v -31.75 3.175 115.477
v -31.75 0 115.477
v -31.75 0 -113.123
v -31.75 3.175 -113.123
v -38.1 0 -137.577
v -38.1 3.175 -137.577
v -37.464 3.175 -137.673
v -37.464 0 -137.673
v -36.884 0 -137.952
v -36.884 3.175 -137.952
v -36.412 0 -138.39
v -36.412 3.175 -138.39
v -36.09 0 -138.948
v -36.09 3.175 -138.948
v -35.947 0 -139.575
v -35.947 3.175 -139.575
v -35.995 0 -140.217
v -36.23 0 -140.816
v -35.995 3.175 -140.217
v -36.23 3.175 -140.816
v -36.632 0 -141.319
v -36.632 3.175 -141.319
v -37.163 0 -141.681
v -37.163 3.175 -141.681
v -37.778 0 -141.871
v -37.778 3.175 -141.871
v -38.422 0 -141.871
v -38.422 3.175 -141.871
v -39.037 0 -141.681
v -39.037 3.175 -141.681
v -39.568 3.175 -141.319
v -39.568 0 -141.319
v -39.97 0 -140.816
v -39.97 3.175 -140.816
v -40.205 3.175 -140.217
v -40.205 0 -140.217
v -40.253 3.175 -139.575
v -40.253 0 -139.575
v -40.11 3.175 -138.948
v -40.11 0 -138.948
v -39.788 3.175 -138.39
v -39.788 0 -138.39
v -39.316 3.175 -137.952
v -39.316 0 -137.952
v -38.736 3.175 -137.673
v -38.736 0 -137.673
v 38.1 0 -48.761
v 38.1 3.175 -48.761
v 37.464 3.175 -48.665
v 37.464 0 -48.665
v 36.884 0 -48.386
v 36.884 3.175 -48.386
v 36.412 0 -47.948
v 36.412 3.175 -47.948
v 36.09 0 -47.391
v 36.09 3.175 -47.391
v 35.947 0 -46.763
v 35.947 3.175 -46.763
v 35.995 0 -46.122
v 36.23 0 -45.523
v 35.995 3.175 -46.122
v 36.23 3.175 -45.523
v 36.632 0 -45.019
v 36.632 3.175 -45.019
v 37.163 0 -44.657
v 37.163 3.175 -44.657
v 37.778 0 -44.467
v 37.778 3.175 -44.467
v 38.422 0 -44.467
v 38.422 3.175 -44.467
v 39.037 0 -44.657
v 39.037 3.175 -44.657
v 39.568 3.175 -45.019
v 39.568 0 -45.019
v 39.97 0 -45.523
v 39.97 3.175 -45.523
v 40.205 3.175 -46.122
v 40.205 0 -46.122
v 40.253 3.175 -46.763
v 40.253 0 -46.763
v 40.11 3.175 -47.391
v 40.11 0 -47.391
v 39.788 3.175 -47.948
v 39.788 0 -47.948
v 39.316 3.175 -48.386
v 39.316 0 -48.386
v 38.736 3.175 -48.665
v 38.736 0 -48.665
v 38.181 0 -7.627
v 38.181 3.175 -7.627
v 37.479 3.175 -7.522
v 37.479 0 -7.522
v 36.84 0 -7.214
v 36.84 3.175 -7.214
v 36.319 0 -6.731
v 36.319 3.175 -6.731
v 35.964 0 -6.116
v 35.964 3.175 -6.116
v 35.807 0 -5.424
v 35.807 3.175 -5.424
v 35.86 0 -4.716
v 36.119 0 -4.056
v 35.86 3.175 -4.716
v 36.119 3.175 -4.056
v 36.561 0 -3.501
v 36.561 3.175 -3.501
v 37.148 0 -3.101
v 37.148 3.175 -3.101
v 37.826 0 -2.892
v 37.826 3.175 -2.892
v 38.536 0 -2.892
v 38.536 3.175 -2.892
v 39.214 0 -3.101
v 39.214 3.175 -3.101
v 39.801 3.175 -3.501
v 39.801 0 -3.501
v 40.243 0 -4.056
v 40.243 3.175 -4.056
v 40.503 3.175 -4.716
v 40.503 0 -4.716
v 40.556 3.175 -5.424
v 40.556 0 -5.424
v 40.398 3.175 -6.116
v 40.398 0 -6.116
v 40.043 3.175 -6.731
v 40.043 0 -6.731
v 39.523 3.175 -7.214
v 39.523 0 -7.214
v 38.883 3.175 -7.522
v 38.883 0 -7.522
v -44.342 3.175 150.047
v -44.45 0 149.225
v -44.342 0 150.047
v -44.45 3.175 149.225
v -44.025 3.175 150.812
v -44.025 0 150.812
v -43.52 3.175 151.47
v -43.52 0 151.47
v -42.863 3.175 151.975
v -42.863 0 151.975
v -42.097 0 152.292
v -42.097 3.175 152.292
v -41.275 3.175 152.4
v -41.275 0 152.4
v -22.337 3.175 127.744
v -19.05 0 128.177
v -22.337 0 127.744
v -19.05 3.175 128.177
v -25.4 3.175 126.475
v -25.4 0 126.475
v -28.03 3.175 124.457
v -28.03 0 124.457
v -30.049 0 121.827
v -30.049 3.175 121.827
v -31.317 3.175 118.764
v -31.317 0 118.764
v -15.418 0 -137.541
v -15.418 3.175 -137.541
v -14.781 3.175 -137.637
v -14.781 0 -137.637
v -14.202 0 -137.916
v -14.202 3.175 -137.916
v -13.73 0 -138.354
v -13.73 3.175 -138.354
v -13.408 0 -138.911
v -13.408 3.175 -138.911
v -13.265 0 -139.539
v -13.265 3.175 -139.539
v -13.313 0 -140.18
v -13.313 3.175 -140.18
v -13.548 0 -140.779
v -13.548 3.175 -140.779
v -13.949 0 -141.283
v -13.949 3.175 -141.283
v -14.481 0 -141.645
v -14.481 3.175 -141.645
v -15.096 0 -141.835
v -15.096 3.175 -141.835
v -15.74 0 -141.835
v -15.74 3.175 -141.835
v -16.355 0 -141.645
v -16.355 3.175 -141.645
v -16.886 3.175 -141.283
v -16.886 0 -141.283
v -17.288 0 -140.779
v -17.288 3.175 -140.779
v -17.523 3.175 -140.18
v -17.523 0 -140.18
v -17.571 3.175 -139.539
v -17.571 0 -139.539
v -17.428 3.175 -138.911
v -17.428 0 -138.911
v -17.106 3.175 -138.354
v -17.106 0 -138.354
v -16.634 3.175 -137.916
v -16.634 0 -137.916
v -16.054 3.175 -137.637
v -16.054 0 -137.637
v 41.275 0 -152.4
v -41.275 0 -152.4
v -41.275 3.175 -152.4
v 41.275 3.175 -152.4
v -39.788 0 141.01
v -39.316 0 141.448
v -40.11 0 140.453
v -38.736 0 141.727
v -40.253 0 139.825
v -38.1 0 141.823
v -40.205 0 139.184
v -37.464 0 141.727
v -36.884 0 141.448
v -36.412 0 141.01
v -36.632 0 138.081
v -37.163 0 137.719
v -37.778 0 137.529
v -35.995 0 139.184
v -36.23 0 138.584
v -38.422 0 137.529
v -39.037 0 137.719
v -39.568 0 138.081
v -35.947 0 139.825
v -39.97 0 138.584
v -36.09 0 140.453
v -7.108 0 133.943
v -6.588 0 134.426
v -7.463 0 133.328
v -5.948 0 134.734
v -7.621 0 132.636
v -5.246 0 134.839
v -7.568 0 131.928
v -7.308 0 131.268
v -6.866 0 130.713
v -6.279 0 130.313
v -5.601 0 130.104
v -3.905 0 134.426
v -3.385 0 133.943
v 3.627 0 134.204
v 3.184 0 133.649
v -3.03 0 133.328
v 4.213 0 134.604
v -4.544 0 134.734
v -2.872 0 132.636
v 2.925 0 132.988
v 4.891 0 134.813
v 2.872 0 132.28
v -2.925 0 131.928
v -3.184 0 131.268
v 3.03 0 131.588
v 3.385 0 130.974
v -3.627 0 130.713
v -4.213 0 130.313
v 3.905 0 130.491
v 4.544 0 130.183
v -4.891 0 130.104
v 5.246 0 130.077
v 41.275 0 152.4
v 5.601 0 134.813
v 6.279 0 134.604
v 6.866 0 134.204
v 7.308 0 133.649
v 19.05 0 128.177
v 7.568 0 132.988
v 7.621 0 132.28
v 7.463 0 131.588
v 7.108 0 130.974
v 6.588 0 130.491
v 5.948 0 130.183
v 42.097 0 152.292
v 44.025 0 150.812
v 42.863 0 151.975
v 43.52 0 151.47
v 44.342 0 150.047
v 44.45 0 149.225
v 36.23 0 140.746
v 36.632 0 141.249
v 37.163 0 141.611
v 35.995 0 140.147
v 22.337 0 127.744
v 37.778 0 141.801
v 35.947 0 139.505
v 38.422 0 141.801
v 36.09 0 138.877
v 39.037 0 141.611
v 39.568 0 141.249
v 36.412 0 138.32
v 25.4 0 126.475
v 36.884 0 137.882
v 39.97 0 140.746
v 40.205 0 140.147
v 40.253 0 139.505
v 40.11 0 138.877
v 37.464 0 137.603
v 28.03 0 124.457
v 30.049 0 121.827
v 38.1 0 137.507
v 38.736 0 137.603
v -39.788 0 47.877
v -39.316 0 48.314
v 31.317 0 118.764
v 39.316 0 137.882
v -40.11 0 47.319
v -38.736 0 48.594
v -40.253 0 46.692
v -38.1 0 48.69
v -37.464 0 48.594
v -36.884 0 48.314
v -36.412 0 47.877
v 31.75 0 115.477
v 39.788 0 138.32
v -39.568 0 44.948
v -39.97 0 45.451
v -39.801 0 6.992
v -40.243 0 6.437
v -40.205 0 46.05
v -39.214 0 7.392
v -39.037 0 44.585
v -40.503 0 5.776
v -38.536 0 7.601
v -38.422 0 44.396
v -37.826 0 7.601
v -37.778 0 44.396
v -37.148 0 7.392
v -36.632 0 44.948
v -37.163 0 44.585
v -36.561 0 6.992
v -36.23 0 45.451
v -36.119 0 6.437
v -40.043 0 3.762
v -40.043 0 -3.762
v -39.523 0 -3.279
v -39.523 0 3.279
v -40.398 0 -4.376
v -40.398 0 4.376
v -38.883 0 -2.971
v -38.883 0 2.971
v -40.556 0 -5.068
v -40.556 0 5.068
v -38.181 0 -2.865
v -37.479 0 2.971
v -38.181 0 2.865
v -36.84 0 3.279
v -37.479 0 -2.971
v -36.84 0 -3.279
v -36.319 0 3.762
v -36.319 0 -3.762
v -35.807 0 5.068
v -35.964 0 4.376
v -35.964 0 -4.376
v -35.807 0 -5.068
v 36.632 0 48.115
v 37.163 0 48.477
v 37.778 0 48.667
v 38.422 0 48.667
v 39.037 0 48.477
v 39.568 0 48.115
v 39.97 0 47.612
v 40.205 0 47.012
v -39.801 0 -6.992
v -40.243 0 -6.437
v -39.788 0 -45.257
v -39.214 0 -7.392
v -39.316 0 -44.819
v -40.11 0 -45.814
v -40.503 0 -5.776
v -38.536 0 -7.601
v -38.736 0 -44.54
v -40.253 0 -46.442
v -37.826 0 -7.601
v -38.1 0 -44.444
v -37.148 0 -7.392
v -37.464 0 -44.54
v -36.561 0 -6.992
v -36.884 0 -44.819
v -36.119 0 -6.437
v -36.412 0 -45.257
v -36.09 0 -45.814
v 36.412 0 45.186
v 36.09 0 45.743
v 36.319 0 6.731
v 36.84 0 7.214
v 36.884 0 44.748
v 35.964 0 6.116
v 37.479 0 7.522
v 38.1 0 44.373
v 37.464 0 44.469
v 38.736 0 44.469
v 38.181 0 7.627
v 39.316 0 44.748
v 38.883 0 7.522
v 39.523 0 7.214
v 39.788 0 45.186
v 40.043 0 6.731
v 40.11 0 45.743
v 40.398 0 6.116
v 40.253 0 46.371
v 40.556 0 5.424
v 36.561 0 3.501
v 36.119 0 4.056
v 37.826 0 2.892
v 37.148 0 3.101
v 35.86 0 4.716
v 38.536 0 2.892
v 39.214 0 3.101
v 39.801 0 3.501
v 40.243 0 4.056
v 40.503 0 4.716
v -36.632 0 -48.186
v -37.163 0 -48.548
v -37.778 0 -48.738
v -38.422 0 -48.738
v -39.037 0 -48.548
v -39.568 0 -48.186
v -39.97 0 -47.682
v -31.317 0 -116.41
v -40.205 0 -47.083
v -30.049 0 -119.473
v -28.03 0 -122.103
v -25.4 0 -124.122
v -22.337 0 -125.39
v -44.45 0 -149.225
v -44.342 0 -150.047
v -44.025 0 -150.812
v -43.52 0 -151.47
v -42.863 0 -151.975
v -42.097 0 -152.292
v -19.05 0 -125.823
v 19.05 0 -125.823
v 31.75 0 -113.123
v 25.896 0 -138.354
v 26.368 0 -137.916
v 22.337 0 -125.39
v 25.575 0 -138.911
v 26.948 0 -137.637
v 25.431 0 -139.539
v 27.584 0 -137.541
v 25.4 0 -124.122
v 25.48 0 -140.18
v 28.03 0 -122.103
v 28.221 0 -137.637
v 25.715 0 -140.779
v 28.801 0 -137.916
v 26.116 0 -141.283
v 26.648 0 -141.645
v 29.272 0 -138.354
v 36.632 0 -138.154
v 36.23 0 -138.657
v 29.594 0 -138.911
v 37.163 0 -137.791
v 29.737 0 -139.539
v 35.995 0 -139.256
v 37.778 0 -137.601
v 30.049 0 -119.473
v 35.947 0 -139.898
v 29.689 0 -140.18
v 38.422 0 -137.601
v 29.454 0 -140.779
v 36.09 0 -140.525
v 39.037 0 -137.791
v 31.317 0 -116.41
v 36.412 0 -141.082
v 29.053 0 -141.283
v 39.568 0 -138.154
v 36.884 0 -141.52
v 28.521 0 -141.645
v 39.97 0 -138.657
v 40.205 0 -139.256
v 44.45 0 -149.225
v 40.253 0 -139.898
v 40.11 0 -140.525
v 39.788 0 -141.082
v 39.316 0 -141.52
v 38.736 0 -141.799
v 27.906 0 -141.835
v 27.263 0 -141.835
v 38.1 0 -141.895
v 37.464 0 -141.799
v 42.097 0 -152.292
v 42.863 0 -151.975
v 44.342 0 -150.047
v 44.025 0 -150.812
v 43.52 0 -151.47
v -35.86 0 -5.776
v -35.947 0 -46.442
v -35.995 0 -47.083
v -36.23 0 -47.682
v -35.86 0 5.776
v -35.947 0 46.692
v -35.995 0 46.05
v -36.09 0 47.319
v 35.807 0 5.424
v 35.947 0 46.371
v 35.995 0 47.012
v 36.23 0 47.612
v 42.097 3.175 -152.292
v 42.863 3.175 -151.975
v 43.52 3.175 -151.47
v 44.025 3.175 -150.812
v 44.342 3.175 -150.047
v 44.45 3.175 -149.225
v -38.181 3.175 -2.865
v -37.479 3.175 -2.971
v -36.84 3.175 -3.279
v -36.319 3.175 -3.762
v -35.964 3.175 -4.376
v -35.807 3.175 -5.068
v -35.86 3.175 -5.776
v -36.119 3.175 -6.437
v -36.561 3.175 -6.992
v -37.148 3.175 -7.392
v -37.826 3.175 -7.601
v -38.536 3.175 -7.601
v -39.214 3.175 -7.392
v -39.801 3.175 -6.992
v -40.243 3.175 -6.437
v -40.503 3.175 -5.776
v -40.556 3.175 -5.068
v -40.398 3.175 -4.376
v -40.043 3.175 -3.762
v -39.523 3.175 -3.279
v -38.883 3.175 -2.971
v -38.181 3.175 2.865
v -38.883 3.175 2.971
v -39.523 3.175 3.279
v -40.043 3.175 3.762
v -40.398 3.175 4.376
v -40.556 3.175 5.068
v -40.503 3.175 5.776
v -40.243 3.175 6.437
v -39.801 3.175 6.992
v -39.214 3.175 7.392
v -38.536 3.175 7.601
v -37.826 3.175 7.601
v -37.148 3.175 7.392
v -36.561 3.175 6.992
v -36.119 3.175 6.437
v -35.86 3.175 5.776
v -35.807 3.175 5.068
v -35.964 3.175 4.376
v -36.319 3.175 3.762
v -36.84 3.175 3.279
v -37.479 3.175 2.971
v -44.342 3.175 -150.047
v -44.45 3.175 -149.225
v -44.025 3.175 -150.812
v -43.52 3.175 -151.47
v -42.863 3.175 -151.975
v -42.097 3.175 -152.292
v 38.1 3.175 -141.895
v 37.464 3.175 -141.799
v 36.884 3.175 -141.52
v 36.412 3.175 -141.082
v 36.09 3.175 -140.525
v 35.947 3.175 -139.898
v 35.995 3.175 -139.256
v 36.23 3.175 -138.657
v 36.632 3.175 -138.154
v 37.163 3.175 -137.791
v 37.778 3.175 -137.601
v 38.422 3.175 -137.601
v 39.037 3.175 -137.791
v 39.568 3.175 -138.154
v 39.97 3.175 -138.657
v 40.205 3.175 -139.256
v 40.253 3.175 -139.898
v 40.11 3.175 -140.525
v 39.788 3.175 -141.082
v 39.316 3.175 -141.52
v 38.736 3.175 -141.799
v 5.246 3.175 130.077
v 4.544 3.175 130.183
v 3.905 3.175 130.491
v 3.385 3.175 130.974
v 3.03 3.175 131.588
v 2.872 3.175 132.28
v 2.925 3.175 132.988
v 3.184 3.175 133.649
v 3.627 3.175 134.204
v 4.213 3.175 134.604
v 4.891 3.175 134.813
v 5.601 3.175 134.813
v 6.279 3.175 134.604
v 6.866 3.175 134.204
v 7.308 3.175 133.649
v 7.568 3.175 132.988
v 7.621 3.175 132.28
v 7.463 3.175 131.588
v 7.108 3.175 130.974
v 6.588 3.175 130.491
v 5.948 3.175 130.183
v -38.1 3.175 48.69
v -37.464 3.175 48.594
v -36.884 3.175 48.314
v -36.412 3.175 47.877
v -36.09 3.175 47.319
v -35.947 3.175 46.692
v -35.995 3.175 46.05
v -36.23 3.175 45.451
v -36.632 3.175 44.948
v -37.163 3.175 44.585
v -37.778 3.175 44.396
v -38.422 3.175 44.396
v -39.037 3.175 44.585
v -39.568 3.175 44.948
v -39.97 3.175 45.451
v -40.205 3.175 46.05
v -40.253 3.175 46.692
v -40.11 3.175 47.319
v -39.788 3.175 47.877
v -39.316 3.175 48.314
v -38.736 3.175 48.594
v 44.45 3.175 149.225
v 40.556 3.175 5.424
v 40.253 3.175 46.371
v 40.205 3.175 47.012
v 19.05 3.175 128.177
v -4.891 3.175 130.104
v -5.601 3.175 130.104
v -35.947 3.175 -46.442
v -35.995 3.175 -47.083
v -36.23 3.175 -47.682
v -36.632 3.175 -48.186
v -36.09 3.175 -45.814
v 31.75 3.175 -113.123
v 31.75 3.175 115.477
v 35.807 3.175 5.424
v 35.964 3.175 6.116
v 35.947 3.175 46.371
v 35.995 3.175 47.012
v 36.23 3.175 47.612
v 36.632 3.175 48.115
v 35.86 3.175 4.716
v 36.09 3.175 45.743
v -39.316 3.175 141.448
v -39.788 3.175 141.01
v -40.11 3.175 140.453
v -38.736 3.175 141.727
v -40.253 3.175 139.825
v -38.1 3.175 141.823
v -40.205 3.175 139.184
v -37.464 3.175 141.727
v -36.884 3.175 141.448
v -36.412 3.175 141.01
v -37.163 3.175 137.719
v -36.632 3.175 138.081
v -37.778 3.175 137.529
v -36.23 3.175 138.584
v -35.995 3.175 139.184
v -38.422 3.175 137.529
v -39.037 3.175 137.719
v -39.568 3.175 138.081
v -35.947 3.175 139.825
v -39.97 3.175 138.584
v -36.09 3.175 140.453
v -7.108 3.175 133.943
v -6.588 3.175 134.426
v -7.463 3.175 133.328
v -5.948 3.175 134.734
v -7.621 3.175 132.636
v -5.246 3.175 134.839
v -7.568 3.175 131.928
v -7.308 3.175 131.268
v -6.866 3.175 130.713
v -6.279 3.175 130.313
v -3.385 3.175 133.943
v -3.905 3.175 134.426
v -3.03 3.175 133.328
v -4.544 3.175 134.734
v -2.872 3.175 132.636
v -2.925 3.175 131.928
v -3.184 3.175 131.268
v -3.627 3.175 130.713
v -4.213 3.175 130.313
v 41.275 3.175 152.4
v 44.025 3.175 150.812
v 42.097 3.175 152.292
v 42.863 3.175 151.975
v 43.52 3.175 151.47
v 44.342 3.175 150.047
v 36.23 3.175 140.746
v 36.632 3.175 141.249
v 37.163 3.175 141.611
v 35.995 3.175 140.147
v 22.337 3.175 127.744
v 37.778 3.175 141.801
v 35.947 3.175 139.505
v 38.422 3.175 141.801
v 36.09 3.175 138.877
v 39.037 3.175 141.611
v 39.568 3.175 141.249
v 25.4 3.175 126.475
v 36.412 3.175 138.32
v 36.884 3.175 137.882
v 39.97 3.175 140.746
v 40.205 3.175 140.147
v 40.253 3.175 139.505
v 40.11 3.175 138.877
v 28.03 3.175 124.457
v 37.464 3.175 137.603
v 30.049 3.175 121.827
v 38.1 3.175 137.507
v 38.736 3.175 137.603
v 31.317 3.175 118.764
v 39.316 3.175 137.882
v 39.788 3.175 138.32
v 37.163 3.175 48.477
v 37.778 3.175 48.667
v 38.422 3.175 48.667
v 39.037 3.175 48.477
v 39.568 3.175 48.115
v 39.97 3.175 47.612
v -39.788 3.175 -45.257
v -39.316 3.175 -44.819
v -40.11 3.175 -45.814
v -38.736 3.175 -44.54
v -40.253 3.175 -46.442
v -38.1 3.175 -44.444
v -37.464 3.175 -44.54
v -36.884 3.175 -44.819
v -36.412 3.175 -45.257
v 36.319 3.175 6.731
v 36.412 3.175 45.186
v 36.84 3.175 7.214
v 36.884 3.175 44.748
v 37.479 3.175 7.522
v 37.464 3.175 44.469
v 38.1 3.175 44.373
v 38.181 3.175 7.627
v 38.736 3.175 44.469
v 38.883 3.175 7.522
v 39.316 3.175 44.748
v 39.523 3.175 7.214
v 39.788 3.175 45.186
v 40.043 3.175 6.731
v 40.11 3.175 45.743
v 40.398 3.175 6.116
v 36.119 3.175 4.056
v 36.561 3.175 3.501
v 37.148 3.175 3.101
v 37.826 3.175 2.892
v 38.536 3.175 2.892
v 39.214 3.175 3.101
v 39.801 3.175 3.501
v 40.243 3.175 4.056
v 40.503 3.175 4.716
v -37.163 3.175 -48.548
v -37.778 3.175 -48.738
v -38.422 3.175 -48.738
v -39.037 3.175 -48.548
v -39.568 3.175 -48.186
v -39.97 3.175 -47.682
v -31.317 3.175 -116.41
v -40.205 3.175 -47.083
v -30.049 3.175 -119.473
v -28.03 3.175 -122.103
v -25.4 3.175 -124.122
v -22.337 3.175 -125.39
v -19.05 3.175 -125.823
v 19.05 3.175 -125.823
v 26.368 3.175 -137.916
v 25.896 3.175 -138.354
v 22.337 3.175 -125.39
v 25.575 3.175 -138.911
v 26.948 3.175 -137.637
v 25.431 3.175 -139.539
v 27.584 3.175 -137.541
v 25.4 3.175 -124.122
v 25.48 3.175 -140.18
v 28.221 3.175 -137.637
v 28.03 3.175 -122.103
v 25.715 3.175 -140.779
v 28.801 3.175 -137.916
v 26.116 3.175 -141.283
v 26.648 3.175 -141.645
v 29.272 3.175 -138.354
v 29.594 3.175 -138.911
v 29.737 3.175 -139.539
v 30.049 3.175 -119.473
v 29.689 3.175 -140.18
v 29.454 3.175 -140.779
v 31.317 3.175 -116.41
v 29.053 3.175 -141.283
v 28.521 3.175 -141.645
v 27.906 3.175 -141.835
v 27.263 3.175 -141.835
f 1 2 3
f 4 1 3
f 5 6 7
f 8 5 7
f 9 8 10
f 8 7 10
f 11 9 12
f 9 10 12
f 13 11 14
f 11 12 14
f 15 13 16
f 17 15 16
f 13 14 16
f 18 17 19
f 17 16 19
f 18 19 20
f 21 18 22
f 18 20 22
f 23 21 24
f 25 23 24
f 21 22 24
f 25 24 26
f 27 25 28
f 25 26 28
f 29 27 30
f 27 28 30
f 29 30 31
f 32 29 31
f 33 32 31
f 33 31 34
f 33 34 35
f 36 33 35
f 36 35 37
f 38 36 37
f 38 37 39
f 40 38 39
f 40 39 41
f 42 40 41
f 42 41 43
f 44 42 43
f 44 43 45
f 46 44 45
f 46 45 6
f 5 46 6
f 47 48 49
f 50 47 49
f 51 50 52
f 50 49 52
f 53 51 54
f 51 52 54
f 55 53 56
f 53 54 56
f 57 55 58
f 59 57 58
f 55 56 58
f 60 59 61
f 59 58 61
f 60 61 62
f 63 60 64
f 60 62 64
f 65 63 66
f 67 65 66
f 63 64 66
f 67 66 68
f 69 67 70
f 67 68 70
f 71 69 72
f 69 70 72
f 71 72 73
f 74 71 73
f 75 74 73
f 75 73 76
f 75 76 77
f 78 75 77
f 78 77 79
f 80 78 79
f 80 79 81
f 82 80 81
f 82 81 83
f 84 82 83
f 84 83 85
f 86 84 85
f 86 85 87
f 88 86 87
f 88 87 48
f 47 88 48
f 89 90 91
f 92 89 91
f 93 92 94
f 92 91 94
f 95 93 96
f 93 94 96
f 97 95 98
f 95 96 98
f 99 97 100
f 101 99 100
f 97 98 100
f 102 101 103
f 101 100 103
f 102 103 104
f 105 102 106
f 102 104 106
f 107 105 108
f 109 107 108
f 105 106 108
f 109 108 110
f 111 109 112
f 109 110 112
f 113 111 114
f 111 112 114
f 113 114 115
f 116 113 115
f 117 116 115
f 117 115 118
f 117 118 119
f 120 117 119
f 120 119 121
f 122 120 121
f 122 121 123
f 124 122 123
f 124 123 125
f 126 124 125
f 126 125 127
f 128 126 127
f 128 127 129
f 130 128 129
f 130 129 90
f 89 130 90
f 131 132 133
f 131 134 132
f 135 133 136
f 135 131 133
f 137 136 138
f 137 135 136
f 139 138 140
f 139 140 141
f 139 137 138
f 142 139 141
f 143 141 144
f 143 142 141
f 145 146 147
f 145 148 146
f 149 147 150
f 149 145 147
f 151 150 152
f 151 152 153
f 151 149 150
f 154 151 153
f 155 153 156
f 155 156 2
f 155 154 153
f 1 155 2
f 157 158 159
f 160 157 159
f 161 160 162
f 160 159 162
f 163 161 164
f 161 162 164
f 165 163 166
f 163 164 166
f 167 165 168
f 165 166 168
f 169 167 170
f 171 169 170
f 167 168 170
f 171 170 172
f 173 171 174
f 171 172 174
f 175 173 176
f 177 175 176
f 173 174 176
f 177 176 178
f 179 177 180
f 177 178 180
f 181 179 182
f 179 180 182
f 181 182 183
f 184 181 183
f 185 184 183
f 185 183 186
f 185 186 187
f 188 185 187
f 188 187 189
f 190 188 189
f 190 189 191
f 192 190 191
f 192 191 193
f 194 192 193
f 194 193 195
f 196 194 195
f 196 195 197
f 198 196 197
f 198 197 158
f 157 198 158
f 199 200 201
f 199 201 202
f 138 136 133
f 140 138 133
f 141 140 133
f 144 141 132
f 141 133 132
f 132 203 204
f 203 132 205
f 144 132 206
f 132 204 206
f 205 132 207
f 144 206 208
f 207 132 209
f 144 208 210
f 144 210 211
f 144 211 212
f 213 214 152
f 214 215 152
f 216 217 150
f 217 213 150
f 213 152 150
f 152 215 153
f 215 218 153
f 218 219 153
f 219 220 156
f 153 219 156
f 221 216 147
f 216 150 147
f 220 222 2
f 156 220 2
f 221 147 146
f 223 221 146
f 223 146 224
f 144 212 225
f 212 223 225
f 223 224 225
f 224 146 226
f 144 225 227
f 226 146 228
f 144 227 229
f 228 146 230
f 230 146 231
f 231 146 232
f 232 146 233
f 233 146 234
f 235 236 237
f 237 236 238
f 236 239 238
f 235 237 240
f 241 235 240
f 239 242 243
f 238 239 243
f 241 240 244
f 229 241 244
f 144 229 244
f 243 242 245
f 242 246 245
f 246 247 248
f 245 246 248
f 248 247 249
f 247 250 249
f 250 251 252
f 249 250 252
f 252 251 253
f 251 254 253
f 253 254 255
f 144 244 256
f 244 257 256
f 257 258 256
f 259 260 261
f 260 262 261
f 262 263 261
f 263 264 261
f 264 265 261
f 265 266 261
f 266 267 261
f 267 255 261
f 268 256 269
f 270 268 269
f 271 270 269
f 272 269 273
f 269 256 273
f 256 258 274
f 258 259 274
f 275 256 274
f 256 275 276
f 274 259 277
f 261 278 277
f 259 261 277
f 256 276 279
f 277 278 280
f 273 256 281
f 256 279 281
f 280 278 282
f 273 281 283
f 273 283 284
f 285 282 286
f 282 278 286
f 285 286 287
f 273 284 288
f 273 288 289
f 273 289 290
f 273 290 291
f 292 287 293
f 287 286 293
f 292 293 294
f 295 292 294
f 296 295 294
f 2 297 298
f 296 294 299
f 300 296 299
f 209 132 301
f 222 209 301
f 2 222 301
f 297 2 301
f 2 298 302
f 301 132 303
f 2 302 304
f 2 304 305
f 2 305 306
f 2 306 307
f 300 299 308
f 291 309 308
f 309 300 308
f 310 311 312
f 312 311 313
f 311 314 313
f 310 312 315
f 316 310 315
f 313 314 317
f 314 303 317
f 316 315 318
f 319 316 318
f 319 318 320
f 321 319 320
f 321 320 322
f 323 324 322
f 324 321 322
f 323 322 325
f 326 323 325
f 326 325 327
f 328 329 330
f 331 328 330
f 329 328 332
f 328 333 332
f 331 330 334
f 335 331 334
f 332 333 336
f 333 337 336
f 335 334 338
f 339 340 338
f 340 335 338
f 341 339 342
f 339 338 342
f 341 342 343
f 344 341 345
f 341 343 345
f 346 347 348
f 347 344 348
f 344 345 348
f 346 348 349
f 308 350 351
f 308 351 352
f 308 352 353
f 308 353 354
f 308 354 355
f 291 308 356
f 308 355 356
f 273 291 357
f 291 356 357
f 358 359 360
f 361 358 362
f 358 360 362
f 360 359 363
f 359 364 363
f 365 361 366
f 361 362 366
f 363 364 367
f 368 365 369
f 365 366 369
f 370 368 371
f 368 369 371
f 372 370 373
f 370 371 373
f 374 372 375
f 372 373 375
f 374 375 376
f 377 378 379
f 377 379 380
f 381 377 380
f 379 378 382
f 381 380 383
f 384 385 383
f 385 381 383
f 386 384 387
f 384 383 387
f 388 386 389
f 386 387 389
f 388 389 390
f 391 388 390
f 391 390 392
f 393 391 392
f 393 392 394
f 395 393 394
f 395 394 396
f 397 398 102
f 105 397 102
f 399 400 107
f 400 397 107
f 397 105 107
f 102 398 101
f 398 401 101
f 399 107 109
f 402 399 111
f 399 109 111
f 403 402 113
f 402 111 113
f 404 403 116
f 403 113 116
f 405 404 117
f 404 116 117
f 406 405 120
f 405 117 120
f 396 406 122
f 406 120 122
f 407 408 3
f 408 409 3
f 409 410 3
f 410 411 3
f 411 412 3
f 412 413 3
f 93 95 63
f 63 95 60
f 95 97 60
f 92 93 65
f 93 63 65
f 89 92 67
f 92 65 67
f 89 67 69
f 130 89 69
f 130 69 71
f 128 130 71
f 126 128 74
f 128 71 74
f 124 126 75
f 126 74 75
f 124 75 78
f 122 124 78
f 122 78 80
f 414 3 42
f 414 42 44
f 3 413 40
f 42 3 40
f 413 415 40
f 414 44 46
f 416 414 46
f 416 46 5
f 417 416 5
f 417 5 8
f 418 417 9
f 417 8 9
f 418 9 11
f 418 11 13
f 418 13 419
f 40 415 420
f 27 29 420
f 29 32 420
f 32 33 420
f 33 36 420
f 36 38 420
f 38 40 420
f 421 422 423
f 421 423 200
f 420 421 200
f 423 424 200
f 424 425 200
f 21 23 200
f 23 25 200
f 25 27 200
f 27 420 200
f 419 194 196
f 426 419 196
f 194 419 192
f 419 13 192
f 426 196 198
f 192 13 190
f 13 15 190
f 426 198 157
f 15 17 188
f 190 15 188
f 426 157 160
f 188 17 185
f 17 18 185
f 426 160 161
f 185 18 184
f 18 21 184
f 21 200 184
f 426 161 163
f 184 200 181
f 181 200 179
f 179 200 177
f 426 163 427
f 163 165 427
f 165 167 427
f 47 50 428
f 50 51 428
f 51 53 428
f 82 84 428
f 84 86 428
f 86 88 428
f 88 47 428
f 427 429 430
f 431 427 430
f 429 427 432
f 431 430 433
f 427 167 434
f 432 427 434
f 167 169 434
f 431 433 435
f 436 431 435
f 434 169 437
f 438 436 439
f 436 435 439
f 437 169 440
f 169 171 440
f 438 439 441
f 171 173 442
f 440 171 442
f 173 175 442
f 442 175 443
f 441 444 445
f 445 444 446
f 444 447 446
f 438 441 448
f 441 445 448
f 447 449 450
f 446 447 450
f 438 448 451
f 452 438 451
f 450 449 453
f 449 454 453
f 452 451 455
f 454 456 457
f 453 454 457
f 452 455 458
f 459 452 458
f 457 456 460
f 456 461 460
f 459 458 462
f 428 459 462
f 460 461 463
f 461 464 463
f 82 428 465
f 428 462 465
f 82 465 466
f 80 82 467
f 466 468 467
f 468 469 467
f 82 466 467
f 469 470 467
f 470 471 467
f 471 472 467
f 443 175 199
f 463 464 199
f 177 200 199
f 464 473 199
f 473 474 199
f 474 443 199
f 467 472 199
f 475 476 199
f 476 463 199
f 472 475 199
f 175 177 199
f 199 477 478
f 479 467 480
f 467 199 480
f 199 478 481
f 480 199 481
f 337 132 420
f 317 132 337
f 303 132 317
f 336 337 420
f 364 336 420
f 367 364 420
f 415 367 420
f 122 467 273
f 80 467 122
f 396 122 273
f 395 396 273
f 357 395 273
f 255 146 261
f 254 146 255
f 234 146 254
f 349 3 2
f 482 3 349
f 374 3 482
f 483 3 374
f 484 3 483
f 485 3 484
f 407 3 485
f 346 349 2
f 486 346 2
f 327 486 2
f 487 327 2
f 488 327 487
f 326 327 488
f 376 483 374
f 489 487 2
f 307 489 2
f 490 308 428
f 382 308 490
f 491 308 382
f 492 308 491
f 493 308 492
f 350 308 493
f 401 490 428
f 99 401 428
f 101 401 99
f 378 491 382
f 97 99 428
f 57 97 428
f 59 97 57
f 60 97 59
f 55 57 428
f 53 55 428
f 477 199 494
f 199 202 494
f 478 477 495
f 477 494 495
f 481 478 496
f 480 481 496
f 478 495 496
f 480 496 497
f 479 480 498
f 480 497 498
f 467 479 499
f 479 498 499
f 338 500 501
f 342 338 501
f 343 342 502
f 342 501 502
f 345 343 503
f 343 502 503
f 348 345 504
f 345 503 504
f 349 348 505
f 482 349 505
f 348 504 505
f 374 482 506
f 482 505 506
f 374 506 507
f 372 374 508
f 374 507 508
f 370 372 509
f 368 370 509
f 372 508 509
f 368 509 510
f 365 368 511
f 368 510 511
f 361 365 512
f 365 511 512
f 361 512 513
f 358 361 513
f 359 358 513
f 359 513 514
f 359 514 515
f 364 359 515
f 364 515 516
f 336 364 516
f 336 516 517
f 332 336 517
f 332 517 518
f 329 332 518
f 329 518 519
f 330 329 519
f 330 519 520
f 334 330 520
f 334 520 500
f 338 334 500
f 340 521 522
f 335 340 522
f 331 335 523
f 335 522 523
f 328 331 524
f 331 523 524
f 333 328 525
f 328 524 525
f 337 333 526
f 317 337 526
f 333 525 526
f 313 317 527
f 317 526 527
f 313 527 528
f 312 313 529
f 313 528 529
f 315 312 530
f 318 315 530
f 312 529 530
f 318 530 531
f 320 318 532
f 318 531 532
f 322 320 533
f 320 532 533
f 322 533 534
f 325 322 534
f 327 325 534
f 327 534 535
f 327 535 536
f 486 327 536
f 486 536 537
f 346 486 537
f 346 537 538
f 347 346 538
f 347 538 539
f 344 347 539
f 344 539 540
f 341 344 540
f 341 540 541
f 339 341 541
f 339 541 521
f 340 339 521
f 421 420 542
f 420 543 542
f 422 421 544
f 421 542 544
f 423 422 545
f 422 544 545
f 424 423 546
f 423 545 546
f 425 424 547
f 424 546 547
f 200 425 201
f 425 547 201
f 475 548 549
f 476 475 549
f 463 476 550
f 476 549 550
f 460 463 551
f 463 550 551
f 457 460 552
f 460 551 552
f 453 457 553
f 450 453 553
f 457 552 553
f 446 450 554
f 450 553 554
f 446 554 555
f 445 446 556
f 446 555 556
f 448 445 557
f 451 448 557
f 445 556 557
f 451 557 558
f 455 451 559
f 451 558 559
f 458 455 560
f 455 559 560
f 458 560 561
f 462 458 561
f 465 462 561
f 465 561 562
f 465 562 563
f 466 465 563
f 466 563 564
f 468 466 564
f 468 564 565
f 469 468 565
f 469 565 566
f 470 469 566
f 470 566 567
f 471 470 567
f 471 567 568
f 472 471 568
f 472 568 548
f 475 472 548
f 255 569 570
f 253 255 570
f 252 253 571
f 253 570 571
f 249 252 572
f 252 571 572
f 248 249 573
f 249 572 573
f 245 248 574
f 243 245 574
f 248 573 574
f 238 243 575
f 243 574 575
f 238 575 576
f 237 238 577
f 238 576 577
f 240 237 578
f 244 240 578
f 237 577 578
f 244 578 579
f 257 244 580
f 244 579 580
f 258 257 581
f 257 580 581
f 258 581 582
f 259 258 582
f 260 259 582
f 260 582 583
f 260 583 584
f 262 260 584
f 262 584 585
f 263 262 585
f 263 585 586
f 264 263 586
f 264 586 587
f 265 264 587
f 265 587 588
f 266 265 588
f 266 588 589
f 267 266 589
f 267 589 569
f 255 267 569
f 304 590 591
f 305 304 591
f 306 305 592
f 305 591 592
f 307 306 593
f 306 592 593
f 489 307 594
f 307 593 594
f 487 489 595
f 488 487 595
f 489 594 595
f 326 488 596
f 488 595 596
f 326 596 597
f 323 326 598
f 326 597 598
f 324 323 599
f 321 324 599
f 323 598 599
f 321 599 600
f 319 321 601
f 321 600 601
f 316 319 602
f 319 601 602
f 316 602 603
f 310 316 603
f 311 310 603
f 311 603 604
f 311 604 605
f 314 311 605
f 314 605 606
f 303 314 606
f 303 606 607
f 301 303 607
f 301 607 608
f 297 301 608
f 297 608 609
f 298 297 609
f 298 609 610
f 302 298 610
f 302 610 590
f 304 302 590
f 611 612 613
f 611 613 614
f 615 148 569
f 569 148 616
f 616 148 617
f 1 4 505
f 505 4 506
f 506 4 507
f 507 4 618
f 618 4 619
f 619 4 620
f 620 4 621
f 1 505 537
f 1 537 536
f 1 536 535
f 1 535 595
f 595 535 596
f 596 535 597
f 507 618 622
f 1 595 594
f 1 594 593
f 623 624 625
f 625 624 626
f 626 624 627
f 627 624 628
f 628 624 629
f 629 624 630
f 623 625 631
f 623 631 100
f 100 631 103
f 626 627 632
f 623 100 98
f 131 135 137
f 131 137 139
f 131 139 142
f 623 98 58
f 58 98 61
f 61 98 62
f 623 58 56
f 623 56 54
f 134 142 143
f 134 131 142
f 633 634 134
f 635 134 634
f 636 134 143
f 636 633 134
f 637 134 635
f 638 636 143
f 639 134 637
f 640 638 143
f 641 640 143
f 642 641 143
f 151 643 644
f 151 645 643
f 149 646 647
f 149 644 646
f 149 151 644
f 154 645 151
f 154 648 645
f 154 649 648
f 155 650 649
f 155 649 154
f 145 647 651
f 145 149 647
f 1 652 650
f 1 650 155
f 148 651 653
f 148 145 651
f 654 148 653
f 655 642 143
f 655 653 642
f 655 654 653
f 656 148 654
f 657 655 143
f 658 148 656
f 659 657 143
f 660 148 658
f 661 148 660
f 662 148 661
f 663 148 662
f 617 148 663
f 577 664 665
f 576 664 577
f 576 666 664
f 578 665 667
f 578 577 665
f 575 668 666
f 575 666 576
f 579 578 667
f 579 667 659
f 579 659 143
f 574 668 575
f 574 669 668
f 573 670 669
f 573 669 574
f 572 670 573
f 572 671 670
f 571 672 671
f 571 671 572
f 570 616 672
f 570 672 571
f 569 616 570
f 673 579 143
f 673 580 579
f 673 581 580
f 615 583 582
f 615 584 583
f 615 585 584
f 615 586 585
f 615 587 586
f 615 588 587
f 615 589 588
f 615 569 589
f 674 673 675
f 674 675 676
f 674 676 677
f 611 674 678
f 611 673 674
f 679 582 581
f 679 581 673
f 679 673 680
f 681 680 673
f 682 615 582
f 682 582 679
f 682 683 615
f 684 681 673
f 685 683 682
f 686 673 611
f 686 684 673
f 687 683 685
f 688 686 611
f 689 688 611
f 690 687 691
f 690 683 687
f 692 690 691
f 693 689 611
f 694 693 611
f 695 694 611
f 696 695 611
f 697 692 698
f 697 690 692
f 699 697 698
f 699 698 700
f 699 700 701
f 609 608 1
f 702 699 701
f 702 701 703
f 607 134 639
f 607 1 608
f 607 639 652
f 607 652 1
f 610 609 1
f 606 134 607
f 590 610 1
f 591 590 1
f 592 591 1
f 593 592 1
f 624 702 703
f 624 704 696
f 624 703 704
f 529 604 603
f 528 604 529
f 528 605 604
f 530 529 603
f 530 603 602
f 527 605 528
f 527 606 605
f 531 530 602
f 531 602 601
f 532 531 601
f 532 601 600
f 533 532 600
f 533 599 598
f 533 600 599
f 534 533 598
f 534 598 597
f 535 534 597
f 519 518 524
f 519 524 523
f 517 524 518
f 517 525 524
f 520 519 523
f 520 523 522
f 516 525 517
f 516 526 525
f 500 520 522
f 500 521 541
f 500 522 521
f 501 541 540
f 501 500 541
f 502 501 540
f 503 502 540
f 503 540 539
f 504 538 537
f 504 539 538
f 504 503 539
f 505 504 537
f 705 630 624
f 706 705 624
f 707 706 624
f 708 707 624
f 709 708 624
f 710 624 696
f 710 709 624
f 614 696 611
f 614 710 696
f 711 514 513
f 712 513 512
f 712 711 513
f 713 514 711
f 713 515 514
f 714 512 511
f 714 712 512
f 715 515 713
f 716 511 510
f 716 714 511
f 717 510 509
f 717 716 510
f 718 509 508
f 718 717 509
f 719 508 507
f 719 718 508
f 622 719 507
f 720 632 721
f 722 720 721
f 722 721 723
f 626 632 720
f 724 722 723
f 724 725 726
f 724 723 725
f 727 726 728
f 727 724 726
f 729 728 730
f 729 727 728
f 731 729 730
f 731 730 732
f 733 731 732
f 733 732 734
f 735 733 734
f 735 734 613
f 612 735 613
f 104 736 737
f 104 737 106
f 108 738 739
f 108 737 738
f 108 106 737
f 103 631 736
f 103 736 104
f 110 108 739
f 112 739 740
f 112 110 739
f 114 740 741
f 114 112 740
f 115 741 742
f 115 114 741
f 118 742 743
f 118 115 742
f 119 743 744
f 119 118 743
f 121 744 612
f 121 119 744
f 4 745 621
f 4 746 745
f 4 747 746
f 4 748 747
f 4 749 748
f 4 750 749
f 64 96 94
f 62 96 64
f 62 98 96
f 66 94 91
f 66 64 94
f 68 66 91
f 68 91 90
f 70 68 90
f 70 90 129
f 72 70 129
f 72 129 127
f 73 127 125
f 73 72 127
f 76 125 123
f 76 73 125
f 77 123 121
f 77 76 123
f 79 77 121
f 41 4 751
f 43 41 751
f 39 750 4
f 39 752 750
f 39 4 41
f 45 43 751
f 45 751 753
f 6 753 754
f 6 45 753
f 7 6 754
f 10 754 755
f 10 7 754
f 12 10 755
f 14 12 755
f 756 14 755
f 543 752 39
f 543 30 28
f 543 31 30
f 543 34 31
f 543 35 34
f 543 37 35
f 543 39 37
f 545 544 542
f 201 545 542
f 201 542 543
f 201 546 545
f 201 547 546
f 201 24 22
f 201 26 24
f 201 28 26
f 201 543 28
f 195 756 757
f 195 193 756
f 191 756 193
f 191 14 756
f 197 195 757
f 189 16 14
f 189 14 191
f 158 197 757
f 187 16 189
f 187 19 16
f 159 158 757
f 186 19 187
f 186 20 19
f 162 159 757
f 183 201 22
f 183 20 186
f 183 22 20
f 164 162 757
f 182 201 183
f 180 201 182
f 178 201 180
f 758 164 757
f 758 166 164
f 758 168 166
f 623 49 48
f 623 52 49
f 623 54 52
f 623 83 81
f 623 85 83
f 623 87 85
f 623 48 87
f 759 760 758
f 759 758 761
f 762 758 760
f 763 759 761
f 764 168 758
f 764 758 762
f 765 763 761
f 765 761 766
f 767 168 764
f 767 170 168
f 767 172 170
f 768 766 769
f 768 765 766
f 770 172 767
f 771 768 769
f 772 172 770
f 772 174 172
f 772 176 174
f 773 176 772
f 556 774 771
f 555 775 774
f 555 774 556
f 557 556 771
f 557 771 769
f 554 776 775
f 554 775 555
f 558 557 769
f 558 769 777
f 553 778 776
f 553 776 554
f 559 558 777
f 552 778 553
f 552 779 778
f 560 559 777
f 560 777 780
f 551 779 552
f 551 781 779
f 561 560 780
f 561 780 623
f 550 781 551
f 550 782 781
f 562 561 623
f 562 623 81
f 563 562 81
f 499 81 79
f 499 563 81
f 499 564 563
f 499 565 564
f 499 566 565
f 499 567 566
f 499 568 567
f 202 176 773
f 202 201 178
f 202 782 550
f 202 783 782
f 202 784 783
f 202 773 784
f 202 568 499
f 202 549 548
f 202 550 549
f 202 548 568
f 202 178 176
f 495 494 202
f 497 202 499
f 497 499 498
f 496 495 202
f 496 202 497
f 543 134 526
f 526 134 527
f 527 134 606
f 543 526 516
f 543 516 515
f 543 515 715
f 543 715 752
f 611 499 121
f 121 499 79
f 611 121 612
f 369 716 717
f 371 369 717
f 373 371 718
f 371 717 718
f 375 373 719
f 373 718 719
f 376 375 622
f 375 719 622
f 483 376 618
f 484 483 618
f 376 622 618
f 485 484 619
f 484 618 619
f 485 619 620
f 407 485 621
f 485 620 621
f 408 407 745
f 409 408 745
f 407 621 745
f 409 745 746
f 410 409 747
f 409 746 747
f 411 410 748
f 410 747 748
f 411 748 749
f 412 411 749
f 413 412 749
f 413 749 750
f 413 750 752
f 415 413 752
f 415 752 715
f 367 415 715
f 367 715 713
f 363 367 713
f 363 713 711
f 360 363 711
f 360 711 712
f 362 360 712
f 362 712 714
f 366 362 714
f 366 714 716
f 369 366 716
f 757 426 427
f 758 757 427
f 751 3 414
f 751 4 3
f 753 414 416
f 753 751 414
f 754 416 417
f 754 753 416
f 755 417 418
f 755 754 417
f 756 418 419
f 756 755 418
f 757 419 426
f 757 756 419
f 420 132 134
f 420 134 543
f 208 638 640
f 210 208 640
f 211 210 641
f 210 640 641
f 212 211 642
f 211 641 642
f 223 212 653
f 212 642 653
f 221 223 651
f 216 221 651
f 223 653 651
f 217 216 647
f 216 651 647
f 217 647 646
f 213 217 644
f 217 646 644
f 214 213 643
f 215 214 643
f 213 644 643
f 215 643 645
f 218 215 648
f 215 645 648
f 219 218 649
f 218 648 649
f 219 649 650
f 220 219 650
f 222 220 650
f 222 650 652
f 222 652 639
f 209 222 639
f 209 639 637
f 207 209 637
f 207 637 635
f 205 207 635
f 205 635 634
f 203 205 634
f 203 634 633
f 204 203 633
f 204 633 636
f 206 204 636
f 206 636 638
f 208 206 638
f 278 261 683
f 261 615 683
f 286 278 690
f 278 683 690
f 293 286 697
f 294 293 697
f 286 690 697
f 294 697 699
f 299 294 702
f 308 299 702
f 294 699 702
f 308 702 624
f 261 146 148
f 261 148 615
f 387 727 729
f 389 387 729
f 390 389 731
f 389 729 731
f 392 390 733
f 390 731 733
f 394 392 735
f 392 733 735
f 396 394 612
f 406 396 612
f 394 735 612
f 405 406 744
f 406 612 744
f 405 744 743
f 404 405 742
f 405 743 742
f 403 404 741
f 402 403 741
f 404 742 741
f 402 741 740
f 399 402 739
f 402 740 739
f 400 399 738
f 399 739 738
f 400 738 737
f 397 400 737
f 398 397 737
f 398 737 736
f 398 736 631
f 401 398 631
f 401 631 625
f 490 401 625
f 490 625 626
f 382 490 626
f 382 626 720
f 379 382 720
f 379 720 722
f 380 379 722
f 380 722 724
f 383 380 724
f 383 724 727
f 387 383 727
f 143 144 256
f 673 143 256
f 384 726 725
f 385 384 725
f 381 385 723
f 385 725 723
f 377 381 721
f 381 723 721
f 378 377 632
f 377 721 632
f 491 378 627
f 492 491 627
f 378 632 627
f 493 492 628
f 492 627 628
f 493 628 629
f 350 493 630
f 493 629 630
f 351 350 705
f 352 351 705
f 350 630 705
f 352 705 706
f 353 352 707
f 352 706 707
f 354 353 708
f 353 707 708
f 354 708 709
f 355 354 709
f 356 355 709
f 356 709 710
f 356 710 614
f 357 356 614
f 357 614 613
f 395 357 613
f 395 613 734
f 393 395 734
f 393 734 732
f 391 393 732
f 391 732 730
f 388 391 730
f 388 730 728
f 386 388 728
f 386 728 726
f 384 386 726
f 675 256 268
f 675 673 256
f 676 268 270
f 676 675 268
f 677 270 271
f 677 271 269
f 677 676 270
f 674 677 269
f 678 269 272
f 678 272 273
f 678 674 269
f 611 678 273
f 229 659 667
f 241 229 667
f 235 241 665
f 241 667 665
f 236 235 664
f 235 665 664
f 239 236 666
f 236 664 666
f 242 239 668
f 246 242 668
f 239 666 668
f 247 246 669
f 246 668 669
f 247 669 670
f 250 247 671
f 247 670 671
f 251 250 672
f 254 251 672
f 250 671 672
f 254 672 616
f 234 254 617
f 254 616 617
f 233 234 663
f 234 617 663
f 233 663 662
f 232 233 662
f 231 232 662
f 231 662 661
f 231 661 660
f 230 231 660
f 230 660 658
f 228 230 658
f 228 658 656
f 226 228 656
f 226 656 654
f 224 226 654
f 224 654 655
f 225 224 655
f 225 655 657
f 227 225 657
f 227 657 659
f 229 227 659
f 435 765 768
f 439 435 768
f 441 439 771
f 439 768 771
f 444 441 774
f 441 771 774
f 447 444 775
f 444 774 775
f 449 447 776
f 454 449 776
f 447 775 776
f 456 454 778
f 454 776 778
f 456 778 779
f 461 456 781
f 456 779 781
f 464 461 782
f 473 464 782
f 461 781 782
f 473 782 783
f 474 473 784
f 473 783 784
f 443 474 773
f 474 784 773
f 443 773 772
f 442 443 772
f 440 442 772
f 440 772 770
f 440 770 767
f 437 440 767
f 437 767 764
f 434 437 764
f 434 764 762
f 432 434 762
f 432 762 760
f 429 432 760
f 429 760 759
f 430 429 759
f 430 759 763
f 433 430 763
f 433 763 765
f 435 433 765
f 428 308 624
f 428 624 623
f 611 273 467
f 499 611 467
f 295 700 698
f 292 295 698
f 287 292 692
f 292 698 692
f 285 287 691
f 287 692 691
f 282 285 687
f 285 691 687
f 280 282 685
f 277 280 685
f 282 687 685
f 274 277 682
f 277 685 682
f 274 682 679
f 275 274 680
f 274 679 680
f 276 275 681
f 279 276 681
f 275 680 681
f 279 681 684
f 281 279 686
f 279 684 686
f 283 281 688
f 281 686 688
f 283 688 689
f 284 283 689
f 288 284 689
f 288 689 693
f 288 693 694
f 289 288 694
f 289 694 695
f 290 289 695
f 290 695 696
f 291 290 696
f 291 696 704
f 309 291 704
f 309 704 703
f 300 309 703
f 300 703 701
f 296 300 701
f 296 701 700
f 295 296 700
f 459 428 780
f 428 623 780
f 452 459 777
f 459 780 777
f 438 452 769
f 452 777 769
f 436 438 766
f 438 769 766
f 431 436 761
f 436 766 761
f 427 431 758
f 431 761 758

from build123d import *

# Parameters (mm, degrees)
SKETCH1_W                             = 88.9
SKETCH1_H                             = 304.8
SKETCH1_W_2                           = 63.5
SKETCH1_H_2                           = 254
BOSS_EXTRUDE1_DEPTH                   = 3.175
SKETCH7_R                             = 2.159
CUT_EXTRUDE2_DEPTH                    = 159.781746826
FILLET1_R                             = 12.7
FILLET3_R                             = 3.175
SKETCH9_R                             = 2.159
CUT_EXTRUDE4_DEPTH                    = 159.781746826
SKETCH10_R                            = 2.38125
SONAR_HOLES_DEPTH                     = 159.781746826
SKETCH11_R                            = 2.38125
SONAR_HOLES_2_ELECTRIC_BOOGALOO_DEPTH = 159.781746826


with BuildPart() as part:
    # Sketch1 → Boss-Extrude1 (new body)
    with BuildSketch(Plane(origin=(0, 0, 0), x_dir=(1, 0, 0), z_dir=(0, 1, 0))):
        Rectangle(SKETCH1_W, SKETCH1_H)
        with Locations((0, -1.176932577)):
            Rectangle(SKETCH1_W_2, SKETCH1_H_2, mode=Mode.SUBTRACT)
    extrude(amount=BOSS_EXTRUDE1_DEPTH)

    # Sketch7 → Cut-Extrude2 (cut, through all)
    with BuildSketch(Plane(origin=(0, 3.175, 0), x_dir=(1, 0, 0), z_dir=(0, 1, 0))):
        with Locations(Location((-38.1, 139.736298381, 0), (0, 0, 270))):
            Circle(SKETCH7_R)
        with Locations(Location((38.1, 139.736298381, 0), (0, 0, 90))):
            Circle(SKETCH7_R)
        with Locations(Location((-38.1, 46.602880381, 0), (0, 0, 270))):
            Circle(SKETCH7_R)
        with Locations(Location((-38.1, -46.530537619, 0), (0, 0, 270))):
            Circle(SKETCH7_R)
        with Locations(Location((-38.1, -139.663955619, 0), (0, 0, 270))):
            Circle(SKETCH7_R)
        with Locations(Location((38.1, 46.602118381, 0), (0, 0, 90))):
            Circle(SKETCH7_R)
        with Locations(Location((38.1, -46.532061619, 0), (0, 0, 90))):
            Circle(SKETCH7_R)
        with Locations(Location((38.1, -139.666241619, 0), (0, 0, 90))):
            Circle(SKETCH7_R)
    extrude(amount=-CUT_EXTRUDE2_DEPTH, mode=Mode.SUBTRACT)

    # Fillet1
    fillet1_edges = [part.edges().sort_by_distance(p)[0] for p in [
        (-31.75, 1.5875, -125.823067423),
        (-31.75, 1.5875, 128.176932577),
        (31.75, 1.5875, 128.176932577),
        (31.75, 1.5875, -125.823067423),
    ]]
    fillet(fillet1_edges, radius=FILLET1_R)

    # Fillet3
    fillet3_edges = [part.edges().sort_by_distance(p)[0] for p in [
        (-44.45, 1.5875, -152.4),
        (44.45, 1.5875, -152.4),
        (44.45, 1.5875, 152.4),
        (-44.45, 1.5875, 152.4),
    ]]
    fillet(fillet3_edges, radius=FILLET3_R)

    # Sketch9 → Cut-Extrude4 (cut, through all)
    with BuildSketch(Plane(origin=(0, 3.175, 0), x_dir=(1, 0, 0), z_dir=(0, 1, 0))):
        with Locations(Location((-15.4178, 139.7, 0), (0, 0, 270))):
            Circle(SKETCH9_R)
        with Locations(Location((27.5844, 139.7, 0), (0, 0, 270))):
            Circle(SKETCH9_R)
    extrude(amount=-CUT_EXTRUDE4_DEPTH, mode=Mode.SUBTRACT)

    # Sketch10 → Sonar Holes (cut, through all)
    with BuildSketch(Plane(origin=(0, 3.175, 0), x_dir=(1, 0, 0), z_dir=(0, 1, 0))):
        with Locations(Location((-5.246249985, -132.458232577, 0), (0, 0, 270))):
            Circle(SKETCH10_R)
        with Locations(Location((5.246249985, -132.458232577, 0), (0, 0, 90))):
            Circle(SKETCH10_R)
    extrude(amount=-SONAR_HOLES_DEPTH, mode=Mode.SUBTRACT)

    # Sketch11 → Sonar Holes 2: Electric Boogaloo (cut, through all)
    with BuildSketch(Plane(origin=(0, 3.175, 0), x_dir=(1, 0, 0), z_dir=(0, 1, 0))):
        with Locations(Location((-38.181117115, 5.24625, 0), (0, 0, 270))):
            Circle(SKETCH11_R)
        with Locations(Location((-38.181117115, -5.24625, 0), (0, 0, 90))):
            Circle(SKETCH11_R)
        with Locations(Location((38.181117115, -5.24625, 0), (0, 0, 270))):
            Circle(SKETCH11_R)
        with Locations(Location((38.181117115, 5.24625, 0), (0, 0, 90))):
            Circle(SKETCH11_R)
    extrude(amount=-SONAR_HOLES_2_ELECTRIC_BOOGALOO_DEPTH, mode=Mode.SUBTRACT)


solid = part.part
